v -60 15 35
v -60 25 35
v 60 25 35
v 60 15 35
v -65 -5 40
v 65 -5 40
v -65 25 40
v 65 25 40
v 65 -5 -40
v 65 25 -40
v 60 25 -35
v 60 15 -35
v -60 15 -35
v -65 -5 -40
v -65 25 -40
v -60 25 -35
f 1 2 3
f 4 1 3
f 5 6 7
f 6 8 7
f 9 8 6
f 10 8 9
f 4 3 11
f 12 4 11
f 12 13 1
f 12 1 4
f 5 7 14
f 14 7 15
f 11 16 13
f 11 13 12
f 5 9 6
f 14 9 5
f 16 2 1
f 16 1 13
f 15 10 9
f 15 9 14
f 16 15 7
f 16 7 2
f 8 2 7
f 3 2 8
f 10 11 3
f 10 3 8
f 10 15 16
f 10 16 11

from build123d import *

# Parameters (mm, degrees)
SKETCH2_W           = 130
SKETCH2_H           = 80
BOSS_EXTRUDE1_DEPTH = 25
SKETCH5_W           = 120
SKETCH5_H           = 70
CUT_EXTRUDE1_DEPTH  = 10
SKETCH6_W           = 130
SKETCH6_H           = 80
BOSS_EXTRUDE2_DEPTH = 5


with BuildPart() as part:
    # Sketch2 → Boss-Extrude1 (new body)
    with BuildSketch(Plane(origin=(0, 0, 0), x_dir=(1, 0, 0), z_dir=(0, 1, 0))):
        Rectangle(SKETCH2_W, SKETCH2_H)
    extrude(amount=BOSS_EXTRUDE1_DEPTH)

    # Sketch5 → Cut-Extrude1 (cut)
    with BuildSketch(Plane(origin=(0, 25, 0), x_dir=(1, 0, 0), z_dir=(0, 1, 0))):
        Rectangle(SKETCH5_W, SKETCH5_H)
    extrude(amount=-CUT_EXTRUDE1_DEPTH, mode=Mode.SUBTRACT)

    # Sketch6 → Boss-Extrude2 (add)
    with BuildSketch(Plane(origin=(0, 0, 0), x_dir=(-1, 0, 0), z_dir=(0, -1, 0))):
        Rectangle(SKETCH6_W, SKETCH6_H)
    extrude(amount=BOSS_EXTRUDE2_DEPTH)


solid = part.part
